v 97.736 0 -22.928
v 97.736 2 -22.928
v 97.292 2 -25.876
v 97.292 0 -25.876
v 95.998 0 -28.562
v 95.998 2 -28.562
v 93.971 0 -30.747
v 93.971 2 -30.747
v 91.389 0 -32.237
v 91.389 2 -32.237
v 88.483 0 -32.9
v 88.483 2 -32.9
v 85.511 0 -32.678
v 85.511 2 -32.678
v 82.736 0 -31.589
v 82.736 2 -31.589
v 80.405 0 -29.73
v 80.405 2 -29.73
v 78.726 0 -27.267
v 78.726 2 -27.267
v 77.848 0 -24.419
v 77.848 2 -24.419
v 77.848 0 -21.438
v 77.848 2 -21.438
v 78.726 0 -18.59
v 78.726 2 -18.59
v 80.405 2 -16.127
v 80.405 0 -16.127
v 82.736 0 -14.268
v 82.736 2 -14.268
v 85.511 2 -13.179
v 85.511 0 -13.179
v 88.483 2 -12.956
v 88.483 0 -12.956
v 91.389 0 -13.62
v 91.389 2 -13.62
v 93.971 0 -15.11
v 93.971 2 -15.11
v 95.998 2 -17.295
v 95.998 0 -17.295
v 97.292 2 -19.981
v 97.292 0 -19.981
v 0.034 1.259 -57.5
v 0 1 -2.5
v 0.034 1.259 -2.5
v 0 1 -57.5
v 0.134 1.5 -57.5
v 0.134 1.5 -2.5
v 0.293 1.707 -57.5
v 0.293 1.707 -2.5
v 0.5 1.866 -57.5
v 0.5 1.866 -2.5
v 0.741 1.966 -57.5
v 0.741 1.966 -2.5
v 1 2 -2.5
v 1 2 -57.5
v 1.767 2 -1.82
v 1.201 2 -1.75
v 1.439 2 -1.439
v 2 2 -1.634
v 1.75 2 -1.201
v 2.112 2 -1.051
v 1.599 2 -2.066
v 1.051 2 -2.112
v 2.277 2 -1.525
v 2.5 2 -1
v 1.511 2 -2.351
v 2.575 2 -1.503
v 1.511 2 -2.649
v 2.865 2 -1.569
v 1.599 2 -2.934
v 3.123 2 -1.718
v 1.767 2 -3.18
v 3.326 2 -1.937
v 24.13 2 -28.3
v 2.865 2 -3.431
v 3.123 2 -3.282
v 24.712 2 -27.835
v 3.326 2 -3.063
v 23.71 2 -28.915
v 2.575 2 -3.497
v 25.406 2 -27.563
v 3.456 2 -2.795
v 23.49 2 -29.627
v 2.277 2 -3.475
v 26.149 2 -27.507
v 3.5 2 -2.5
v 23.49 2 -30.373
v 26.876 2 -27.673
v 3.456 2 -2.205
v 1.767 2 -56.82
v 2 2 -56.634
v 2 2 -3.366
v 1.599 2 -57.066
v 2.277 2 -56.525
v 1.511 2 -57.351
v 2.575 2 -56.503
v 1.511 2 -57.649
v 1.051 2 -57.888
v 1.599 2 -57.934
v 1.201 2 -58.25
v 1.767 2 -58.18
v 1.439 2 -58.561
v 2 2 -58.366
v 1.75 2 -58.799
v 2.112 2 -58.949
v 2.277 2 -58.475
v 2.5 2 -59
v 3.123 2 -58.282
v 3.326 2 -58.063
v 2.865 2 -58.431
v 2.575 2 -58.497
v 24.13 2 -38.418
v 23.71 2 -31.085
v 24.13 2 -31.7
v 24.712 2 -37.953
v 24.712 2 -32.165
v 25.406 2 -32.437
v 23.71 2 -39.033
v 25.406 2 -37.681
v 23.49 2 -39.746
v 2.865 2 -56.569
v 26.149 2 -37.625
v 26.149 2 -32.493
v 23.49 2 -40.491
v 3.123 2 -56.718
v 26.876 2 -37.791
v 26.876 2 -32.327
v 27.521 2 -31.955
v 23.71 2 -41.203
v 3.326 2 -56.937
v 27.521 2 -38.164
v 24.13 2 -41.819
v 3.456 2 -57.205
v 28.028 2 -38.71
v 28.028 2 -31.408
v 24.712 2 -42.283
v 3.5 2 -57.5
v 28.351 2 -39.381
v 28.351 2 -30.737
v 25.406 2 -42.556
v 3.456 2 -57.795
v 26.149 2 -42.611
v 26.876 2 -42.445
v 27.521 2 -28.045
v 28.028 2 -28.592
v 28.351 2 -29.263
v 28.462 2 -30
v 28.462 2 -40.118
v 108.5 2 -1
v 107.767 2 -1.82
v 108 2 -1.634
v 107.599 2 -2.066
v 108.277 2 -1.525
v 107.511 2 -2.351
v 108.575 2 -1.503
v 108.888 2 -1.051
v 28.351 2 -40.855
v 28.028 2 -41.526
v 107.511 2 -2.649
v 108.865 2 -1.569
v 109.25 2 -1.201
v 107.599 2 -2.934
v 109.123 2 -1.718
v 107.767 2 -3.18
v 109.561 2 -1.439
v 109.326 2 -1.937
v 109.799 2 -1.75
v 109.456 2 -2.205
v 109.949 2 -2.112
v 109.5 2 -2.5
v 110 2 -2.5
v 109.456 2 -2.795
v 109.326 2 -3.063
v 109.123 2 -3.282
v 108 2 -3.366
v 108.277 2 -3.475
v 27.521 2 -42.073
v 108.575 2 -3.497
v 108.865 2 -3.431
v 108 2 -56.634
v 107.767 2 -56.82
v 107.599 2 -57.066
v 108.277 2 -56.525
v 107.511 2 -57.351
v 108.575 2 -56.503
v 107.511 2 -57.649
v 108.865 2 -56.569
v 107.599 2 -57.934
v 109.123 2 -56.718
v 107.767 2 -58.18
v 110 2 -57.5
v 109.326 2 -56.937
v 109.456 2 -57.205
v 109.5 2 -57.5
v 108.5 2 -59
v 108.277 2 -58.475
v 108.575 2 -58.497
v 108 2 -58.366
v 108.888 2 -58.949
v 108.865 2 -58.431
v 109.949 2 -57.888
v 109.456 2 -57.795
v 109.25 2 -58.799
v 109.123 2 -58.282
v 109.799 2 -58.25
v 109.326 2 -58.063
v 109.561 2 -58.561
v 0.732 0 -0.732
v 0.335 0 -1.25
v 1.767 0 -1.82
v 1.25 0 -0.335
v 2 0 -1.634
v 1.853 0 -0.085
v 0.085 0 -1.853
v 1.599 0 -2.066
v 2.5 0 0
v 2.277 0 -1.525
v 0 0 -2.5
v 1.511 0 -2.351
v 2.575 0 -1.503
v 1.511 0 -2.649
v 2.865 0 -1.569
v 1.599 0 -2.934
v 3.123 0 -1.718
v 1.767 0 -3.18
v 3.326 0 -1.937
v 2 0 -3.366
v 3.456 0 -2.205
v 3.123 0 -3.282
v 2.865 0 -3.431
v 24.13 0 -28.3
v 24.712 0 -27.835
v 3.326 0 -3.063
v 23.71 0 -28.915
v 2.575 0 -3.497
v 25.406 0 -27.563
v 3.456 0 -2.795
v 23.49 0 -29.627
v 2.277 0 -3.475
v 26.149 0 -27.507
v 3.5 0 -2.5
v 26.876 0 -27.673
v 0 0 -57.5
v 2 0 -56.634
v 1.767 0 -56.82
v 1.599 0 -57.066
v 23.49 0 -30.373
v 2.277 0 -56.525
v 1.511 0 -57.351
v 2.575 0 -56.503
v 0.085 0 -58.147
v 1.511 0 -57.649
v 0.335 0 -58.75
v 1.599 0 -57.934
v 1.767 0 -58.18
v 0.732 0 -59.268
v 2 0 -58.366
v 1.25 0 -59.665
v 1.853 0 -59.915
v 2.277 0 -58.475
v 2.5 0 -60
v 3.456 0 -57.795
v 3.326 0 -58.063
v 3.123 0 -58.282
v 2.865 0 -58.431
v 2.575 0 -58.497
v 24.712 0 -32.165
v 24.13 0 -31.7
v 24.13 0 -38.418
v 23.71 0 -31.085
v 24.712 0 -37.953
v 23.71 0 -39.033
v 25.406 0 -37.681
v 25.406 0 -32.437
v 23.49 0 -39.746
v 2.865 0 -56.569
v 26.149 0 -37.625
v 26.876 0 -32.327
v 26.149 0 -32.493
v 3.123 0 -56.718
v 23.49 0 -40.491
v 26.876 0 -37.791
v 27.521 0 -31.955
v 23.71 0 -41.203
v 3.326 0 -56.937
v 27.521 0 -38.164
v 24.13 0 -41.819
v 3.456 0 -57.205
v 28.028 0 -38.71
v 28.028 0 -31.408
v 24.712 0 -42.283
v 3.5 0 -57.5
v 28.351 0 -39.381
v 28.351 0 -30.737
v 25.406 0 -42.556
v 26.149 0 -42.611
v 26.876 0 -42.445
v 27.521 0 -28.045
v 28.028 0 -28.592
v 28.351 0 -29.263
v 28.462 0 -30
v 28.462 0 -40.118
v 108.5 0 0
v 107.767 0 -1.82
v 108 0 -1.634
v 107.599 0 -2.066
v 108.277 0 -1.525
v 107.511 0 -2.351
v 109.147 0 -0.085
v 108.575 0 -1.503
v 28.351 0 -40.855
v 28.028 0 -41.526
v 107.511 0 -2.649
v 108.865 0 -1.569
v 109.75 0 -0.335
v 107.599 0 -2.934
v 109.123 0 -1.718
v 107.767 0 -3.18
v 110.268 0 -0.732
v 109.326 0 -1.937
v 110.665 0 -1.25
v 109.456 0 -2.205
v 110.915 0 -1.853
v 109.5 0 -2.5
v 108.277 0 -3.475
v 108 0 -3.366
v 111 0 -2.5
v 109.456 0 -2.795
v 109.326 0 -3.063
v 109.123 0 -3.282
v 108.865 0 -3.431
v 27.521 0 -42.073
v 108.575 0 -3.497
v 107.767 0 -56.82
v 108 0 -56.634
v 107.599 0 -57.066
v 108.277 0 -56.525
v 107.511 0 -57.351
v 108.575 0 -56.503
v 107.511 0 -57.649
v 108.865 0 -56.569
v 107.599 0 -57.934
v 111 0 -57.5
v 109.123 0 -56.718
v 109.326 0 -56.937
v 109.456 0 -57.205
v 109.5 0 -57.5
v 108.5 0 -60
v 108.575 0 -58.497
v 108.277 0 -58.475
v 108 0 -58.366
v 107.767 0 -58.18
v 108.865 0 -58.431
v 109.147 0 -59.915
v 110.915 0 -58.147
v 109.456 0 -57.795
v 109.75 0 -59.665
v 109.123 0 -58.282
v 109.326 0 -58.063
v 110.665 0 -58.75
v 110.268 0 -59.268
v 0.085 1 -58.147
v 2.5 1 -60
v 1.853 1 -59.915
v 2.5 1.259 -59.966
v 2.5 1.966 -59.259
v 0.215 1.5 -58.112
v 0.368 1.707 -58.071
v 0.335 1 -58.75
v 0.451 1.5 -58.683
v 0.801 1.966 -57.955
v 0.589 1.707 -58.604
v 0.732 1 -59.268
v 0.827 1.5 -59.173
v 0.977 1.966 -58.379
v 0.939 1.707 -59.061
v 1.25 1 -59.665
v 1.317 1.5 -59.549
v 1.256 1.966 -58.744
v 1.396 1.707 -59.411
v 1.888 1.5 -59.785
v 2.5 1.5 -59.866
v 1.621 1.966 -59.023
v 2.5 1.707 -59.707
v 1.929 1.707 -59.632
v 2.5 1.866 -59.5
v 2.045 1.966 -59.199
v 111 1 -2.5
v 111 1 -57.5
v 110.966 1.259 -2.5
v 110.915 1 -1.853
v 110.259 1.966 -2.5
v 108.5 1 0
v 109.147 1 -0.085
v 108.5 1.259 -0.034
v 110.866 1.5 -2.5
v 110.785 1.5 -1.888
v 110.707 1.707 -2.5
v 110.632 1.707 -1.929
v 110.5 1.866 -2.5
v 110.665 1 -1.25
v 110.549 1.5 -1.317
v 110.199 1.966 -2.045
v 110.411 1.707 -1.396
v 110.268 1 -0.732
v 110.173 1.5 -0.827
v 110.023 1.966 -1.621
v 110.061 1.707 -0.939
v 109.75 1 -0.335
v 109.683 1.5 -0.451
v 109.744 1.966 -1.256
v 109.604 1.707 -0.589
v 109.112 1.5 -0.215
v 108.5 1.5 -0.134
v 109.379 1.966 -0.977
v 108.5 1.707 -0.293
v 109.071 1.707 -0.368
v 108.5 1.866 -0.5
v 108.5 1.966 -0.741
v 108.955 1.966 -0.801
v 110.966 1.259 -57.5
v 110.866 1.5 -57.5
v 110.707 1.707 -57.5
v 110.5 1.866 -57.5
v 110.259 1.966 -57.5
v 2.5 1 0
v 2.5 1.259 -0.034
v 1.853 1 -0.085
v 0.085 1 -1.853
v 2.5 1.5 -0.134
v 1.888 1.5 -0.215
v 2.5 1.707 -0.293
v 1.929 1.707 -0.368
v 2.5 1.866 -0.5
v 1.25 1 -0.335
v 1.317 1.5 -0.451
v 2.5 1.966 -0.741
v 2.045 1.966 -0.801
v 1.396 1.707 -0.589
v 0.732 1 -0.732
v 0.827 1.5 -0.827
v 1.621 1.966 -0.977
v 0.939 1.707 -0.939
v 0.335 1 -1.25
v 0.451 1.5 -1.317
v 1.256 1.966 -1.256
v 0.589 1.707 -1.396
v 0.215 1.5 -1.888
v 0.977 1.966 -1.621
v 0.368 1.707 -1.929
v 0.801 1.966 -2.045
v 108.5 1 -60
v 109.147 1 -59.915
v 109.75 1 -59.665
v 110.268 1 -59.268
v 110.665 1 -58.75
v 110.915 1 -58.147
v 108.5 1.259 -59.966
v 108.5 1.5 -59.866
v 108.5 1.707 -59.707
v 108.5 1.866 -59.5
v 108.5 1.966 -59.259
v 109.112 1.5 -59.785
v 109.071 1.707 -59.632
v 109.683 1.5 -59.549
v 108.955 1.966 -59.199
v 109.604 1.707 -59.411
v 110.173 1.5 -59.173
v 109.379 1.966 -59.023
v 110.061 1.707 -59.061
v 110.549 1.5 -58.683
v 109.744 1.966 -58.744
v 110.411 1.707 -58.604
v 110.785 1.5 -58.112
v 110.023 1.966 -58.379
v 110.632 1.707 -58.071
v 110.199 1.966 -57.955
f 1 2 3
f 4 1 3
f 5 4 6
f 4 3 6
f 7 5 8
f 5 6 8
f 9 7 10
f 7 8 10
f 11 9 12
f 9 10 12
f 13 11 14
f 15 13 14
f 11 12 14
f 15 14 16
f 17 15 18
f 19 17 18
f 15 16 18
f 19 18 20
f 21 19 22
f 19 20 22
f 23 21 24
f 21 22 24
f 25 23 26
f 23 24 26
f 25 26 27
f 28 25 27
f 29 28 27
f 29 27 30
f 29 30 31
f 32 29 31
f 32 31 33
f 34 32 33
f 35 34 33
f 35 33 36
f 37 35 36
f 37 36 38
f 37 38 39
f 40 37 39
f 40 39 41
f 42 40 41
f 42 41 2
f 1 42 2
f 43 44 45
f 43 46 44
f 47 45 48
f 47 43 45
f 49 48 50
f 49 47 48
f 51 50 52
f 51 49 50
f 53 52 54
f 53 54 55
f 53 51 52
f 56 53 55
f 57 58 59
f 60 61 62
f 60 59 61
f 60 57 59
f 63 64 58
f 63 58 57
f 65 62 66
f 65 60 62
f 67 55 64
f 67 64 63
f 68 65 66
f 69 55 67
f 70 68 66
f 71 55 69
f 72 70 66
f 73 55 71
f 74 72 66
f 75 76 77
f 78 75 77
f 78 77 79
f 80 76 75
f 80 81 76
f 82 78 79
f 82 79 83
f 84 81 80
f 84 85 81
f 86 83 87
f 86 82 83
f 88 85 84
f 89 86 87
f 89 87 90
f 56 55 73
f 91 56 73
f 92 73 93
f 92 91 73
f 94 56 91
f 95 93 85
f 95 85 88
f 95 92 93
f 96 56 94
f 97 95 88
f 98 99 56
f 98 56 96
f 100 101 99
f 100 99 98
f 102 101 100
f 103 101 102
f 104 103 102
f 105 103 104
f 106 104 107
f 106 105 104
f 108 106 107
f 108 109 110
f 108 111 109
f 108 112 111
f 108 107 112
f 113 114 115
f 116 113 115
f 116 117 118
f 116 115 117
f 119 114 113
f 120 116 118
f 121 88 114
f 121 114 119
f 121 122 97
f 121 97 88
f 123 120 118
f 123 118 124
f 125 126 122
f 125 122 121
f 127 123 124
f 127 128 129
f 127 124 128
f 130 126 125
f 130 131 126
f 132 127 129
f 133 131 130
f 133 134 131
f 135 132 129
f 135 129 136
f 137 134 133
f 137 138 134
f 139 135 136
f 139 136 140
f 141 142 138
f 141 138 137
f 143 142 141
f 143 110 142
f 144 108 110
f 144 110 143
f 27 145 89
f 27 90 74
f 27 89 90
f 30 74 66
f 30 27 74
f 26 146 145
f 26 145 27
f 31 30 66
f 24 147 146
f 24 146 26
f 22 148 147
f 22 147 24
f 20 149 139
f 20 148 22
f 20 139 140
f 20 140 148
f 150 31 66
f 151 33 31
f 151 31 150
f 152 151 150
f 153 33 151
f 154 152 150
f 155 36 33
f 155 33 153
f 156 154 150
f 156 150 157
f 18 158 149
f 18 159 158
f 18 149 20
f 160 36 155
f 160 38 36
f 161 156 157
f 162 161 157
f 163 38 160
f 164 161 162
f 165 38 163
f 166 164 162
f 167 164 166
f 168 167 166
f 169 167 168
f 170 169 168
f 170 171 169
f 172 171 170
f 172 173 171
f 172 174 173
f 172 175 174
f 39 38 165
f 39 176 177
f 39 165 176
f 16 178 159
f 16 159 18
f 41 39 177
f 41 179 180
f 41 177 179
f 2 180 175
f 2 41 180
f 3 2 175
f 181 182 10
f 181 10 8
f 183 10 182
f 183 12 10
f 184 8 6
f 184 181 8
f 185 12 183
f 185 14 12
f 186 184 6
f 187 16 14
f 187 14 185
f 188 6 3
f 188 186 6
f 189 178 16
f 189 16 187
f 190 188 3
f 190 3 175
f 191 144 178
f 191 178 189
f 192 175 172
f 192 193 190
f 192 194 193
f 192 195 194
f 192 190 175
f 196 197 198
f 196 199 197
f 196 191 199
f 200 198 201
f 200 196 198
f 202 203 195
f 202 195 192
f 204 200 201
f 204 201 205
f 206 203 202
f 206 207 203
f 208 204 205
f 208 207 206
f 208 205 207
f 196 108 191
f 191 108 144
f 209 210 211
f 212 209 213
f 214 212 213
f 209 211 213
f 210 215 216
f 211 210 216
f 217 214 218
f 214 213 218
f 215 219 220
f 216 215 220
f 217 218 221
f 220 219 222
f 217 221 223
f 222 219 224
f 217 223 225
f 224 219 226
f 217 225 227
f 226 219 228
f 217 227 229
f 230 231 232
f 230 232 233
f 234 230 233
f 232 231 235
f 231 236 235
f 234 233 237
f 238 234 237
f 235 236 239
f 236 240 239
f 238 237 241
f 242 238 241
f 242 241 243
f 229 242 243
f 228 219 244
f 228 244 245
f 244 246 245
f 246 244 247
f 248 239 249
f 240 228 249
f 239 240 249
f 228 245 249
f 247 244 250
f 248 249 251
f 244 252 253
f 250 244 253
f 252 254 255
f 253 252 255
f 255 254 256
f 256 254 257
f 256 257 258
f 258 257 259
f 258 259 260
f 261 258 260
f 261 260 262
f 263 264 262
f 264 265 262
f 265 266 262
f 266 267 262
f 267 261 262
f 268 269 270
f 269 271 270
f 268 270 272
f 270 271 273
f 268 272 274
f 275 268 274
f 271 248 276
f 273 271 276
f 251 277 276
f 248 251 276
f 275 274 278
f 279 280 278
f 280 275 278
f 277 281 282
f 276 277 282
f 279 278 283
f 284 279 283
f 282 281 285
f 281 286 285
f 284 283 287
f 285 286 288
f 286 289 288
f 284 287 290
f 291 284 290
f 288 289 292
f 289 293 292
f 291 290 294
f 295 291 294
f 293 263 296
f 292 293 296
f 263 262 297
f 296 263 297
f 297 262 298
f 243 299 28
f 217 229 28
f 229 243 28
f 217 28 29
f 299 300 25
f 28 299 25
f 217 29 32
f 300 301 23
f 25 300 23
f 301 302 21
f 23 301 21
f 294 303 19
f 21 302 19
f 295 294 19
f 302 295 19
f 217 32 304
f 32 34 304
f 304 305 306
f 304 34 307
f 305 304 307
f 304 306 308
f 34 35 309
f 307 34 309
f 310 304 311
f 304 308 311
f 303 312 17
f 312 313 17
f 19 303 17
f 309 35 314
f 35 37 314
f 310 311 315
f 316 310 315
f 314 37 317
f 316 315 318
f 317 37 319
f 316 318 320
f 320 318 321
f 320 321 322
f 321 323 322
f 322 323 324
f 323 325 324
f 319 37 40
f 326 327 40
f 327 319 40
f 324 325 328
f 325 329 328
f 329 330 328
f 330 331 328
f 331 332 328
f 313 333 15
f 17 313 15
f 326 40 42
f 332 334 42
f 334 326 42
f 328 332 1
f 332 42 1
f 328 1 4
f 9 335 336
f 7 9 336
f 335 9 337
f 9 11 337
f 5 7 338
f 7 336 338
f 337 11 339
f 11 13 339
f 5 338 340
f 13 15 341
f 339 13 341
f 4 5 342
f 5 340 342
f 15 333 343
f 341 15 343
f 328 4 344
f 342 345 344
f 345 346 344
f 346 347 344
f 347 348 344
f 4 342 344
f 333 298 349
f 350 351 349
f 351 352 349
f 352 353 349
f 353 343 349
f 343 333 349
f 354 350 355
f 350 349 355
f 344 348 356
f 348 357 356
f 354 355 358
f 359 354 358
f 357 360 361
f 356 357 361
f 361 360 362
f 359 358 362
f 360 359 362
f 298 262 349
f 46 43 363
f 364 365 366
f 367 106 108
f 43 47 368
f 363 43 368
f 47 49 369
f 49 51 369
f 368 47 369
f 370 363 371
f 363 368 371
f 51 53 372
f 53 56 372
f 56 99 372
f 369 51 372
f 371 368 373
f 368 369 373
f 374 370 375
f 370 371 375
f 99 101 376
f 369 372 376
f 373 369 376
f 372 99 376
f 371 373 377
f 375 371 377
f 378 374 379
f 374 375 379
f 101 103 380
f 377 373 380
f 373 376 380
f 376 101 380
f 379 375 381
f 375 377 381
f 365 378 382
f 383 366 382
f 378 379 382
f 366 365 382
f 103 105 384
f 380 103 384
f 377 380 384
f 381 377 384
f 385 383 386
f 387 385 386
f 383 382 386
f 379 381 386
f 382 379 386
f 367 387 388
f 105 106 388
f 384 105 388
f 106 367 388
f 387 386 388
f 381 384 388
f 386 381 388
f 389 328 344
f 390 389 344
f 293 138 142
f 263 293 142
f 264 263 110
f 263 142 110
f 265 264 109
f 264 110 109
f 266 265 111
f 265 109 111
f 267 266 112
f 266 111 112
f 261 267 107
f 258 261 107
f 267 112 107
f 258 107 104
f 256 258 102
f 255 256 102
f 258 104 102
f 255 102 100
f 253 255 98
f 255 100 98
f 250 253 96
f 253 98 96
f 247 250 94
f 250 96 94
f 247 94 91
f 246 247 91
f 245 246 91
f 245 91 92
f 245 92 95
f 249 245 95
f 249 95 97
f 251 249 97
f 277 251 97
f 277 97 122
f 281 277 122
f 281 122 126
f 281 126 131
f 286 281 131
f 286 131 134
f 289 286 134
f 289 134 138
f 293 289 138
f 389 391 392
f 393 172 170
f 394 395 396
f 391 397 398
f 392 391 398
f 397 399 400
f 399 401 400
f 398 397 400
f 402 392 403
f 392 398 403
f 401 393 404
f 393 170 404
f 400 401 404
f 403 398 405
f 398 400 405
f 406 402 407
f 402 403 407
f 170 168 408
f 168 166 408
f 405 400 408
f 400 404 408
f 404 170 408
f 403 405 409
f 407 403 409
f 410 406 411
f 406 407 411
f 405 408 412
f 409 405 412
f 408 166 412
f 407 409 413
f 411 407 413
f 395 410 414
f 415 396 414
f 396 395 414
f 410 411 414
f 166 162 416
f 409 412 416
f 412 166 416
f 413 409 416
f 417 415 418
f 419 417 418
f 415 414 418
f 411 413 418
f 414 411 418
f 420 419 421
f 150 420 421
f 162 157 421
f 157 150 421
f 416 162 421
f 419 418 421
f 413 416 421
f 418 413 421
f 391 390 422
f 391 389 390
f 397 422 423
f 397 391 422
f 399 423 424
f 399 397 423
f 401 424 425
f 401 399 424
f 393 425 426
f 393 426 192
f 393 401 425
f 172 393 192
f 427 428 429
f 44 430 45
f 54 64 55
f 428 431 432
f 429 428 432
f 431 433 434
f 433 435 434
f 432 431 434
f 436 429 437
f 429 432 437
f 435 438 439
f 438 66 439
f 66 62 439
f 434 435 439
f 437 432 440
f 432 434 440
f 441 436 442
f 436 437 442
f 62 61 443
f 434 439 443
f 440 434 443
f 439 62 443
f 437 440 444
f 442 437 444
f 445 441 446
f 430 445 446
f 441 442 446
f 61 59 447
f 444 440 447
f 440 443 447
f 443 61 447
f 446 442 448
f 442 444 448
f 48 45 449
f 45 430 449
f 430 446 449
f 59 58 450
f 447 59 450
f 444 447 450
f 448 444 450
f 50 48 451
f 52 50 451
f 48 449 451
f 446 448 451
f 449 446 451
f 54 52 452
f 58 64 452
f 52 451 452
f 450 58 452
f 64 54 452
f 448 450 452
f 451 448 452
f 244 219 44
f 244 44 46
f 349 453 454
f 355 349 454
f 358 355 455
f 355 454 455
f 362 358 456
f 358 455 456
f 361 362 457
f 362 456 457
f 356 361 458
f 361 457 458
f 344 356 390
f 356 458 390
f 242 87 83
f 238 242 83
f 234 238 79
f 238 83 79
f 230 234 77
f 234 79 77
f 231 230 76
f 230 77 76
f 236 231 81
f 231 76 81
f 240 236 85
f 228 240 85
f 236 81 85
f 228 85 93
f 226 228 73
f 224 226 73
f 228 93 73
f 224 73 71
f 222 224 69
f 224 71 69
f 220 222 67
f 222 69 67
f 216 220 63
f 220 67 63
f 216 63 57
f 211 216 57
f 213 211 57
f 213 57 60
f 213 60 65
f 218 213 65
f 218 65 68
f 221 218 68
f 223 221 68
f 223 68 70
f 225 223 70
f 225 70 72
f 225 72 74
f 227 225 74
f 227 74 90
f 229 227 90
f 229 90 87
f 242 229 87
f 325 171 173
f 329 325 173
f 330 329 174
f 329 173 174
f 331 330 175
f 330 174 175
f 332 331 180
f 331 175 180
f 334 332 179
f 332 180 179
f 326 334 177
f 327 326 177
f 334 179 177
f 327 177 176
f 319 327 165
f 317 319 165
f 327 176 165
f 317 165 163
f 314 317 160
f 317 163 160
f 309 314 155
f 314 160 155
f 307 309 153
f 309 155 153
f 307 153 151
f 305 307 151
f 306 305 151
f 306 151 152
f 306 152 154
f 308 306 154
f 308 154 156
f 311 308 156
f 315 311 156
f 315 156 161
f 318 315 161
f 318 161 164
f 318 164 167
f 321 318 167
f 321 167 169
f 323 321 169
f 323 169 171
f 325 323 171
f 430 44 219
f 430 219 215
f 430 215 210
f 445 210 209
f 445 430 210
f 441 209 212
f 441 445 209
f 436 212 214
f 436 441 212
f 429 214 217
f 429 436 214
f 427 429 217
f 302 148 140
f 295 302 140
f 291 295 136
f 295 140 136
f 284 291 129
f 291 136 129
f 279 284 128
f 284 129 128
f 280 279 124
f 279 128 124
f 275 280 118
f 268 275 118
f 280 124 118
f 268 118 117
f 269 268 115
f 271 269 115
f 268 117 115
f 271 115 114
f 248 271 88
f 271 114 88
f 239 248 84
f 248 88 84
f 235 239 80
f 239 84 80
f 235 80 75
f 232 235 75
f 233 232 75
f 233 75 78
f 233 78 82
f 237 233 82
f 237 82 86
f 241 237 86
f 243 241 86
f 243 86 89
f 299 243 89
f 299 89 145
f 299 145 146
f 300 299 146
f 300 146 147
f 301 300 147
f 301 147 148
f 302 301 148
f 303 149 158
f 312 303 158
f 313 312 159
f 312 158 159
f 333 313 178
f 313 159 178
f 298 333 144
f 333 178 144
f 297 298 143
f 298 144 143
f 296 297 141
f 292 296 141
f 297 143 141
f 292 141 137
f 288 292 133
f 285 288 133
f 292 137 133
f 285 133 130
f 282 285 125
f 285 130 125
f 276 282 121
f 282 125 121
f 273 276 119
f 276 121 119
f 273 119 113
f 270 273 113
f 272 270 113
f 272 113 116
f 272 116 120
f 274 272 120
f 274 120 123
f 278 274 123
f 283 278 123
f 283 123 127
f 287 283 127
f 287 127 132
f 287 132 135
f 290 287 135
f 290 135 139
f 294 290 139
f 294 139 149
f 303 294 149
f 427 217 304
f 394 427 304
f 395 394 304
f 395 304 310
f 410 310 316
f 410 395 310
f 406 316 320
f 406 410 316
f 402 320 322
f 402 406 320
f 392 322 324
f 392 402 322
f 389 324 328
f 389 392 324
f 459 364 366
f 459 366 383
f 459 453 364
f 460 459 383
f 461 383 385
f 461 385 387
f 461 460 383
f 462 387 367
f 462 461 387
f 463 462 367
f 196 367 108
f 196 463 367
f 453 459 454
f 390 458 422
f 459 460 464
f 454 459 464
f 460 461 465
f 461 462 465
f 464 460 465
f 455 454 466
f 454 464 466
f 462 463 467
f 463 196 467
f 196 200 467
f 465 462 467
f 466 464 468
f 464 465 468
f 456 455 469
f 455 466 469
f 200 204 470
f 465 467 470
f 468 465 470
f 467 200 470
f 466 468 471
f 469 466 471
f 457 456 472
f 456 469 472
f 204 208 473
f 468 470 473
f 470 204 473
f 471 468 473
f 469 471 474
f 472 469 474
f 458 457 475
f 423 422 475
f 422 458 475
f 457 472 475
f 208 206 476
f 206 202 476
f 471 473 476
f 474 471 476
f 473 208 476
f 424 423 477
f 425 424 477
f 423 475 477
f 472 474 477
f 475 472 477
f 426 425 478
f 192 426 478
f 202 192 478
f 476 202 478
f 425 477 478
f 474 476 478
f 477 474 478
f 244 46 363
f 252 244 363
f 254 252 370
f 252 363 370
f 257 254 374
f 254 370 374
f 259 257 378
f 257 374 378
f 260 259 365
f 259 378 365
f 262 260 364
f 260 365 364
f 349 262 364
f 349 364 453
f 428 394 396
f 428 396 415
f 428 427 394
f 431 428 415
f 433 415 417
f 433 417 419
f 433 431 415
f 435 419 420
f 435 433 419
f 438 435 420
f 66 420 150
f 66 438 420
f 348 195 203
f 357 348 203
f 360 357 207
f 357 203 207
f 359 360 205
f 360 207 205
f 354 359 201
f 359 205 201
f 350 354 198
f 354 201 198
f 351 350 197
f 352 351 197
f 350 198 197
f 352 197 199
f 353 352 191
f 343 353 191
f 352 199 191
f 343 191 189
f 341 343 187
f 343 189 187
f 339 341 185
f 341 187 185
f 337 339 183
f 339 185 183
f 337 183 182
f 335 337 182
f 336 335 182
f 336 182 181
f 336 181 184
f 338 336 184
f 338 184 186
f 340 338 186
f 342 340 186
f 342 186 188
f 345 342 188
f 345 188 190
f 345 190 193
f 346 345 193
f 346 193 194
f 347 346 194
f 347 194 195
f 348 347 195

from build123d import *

# Parameters (mm, degrees)
SKETCH1_W           = 111
SKETCH1_H           = 60
BOSS_EXTRUDE1_DEPTH = 2
SKETCH2_R           = 10
SKETCH2_R_2         = 1
SKETCH2_R_3         = 2.5
CUT_EXTRUDE1_DEPTH  = 3
FILLET1_R           = 2.5
FILLET2_R           = 1


with BuildPart() as part:
    # Sketch1 → Boss-Extrude1 (new body)
    with BuildSketch(Plane(origin=(0, 0, 0), x_dir=(1, 0, 0), z_dir=(0, 1, 0))):
        with Locations((55.5, 30)):
            Rectangle(SKETCH1_W, SKETCH1_H)
    extrude(amount=BOSS_EXTRUDE1_DEPTH)

    # Sketch2 → Cut-Extrude1 (cut, through all)
    with BuildSketch(Plane(origin=(0, 2, 0), x_dir=(1, 0, 0), z_dir=(0, 1, 0))):
        with Locations((87.735933435, 22.928451884)):
            Circle(SKETCH2_R)
        with Locations((2.5, 57.5)):
            Circle(SKETCH2_R_2)
        with Locations((108.5, 57.5)):
            Circle(SKETCH2_R_2)
        with Locations((108.5, 2.5)):
            Circle(SKETCH2_R_2)
        with Locations((2.5, 2.5)):
            Circle(SKETCH2_R_2)
        with Locations((25.9625, 30)):
            Circle(SKETCH2_R_3)
        with Locations((25.9625, 40.118198487)):
            Circle(SKETCH2_R_3)
    extrude(amount=-CUT_EXTRUDE1_DEPTH, mode=Mode.SUBTRACT)

    # Fillet1
    fillet1_edges = [part.edges().sort_by_distance(p)[0] for p in [
        (0, 1, -60),
        (111, 1, -60),
        (111, 1, 0),
        (0, 1, 0),
    ]]
    fillet(fillet1_edges, radius=FILLET1_R)

    # Fillet2
    fillet2_edges = [part.edges().sort_by_distance(p)[0] for p in [
        (0, 2, -30),
        (55.5, 2, -60),
        (55.5, 2, 0),
        (111, 2, -30),
        (110.267766953, 2, -0.732233047),
        (110.267766953, 2, -59.267766953),
        (0.732233047, 2, -0.732233047),
        (0.732233047, 2, -59.267766953),
    ]]
    fillet(fillet2_edges, radius=FILLET2_R)


solid = part.part
